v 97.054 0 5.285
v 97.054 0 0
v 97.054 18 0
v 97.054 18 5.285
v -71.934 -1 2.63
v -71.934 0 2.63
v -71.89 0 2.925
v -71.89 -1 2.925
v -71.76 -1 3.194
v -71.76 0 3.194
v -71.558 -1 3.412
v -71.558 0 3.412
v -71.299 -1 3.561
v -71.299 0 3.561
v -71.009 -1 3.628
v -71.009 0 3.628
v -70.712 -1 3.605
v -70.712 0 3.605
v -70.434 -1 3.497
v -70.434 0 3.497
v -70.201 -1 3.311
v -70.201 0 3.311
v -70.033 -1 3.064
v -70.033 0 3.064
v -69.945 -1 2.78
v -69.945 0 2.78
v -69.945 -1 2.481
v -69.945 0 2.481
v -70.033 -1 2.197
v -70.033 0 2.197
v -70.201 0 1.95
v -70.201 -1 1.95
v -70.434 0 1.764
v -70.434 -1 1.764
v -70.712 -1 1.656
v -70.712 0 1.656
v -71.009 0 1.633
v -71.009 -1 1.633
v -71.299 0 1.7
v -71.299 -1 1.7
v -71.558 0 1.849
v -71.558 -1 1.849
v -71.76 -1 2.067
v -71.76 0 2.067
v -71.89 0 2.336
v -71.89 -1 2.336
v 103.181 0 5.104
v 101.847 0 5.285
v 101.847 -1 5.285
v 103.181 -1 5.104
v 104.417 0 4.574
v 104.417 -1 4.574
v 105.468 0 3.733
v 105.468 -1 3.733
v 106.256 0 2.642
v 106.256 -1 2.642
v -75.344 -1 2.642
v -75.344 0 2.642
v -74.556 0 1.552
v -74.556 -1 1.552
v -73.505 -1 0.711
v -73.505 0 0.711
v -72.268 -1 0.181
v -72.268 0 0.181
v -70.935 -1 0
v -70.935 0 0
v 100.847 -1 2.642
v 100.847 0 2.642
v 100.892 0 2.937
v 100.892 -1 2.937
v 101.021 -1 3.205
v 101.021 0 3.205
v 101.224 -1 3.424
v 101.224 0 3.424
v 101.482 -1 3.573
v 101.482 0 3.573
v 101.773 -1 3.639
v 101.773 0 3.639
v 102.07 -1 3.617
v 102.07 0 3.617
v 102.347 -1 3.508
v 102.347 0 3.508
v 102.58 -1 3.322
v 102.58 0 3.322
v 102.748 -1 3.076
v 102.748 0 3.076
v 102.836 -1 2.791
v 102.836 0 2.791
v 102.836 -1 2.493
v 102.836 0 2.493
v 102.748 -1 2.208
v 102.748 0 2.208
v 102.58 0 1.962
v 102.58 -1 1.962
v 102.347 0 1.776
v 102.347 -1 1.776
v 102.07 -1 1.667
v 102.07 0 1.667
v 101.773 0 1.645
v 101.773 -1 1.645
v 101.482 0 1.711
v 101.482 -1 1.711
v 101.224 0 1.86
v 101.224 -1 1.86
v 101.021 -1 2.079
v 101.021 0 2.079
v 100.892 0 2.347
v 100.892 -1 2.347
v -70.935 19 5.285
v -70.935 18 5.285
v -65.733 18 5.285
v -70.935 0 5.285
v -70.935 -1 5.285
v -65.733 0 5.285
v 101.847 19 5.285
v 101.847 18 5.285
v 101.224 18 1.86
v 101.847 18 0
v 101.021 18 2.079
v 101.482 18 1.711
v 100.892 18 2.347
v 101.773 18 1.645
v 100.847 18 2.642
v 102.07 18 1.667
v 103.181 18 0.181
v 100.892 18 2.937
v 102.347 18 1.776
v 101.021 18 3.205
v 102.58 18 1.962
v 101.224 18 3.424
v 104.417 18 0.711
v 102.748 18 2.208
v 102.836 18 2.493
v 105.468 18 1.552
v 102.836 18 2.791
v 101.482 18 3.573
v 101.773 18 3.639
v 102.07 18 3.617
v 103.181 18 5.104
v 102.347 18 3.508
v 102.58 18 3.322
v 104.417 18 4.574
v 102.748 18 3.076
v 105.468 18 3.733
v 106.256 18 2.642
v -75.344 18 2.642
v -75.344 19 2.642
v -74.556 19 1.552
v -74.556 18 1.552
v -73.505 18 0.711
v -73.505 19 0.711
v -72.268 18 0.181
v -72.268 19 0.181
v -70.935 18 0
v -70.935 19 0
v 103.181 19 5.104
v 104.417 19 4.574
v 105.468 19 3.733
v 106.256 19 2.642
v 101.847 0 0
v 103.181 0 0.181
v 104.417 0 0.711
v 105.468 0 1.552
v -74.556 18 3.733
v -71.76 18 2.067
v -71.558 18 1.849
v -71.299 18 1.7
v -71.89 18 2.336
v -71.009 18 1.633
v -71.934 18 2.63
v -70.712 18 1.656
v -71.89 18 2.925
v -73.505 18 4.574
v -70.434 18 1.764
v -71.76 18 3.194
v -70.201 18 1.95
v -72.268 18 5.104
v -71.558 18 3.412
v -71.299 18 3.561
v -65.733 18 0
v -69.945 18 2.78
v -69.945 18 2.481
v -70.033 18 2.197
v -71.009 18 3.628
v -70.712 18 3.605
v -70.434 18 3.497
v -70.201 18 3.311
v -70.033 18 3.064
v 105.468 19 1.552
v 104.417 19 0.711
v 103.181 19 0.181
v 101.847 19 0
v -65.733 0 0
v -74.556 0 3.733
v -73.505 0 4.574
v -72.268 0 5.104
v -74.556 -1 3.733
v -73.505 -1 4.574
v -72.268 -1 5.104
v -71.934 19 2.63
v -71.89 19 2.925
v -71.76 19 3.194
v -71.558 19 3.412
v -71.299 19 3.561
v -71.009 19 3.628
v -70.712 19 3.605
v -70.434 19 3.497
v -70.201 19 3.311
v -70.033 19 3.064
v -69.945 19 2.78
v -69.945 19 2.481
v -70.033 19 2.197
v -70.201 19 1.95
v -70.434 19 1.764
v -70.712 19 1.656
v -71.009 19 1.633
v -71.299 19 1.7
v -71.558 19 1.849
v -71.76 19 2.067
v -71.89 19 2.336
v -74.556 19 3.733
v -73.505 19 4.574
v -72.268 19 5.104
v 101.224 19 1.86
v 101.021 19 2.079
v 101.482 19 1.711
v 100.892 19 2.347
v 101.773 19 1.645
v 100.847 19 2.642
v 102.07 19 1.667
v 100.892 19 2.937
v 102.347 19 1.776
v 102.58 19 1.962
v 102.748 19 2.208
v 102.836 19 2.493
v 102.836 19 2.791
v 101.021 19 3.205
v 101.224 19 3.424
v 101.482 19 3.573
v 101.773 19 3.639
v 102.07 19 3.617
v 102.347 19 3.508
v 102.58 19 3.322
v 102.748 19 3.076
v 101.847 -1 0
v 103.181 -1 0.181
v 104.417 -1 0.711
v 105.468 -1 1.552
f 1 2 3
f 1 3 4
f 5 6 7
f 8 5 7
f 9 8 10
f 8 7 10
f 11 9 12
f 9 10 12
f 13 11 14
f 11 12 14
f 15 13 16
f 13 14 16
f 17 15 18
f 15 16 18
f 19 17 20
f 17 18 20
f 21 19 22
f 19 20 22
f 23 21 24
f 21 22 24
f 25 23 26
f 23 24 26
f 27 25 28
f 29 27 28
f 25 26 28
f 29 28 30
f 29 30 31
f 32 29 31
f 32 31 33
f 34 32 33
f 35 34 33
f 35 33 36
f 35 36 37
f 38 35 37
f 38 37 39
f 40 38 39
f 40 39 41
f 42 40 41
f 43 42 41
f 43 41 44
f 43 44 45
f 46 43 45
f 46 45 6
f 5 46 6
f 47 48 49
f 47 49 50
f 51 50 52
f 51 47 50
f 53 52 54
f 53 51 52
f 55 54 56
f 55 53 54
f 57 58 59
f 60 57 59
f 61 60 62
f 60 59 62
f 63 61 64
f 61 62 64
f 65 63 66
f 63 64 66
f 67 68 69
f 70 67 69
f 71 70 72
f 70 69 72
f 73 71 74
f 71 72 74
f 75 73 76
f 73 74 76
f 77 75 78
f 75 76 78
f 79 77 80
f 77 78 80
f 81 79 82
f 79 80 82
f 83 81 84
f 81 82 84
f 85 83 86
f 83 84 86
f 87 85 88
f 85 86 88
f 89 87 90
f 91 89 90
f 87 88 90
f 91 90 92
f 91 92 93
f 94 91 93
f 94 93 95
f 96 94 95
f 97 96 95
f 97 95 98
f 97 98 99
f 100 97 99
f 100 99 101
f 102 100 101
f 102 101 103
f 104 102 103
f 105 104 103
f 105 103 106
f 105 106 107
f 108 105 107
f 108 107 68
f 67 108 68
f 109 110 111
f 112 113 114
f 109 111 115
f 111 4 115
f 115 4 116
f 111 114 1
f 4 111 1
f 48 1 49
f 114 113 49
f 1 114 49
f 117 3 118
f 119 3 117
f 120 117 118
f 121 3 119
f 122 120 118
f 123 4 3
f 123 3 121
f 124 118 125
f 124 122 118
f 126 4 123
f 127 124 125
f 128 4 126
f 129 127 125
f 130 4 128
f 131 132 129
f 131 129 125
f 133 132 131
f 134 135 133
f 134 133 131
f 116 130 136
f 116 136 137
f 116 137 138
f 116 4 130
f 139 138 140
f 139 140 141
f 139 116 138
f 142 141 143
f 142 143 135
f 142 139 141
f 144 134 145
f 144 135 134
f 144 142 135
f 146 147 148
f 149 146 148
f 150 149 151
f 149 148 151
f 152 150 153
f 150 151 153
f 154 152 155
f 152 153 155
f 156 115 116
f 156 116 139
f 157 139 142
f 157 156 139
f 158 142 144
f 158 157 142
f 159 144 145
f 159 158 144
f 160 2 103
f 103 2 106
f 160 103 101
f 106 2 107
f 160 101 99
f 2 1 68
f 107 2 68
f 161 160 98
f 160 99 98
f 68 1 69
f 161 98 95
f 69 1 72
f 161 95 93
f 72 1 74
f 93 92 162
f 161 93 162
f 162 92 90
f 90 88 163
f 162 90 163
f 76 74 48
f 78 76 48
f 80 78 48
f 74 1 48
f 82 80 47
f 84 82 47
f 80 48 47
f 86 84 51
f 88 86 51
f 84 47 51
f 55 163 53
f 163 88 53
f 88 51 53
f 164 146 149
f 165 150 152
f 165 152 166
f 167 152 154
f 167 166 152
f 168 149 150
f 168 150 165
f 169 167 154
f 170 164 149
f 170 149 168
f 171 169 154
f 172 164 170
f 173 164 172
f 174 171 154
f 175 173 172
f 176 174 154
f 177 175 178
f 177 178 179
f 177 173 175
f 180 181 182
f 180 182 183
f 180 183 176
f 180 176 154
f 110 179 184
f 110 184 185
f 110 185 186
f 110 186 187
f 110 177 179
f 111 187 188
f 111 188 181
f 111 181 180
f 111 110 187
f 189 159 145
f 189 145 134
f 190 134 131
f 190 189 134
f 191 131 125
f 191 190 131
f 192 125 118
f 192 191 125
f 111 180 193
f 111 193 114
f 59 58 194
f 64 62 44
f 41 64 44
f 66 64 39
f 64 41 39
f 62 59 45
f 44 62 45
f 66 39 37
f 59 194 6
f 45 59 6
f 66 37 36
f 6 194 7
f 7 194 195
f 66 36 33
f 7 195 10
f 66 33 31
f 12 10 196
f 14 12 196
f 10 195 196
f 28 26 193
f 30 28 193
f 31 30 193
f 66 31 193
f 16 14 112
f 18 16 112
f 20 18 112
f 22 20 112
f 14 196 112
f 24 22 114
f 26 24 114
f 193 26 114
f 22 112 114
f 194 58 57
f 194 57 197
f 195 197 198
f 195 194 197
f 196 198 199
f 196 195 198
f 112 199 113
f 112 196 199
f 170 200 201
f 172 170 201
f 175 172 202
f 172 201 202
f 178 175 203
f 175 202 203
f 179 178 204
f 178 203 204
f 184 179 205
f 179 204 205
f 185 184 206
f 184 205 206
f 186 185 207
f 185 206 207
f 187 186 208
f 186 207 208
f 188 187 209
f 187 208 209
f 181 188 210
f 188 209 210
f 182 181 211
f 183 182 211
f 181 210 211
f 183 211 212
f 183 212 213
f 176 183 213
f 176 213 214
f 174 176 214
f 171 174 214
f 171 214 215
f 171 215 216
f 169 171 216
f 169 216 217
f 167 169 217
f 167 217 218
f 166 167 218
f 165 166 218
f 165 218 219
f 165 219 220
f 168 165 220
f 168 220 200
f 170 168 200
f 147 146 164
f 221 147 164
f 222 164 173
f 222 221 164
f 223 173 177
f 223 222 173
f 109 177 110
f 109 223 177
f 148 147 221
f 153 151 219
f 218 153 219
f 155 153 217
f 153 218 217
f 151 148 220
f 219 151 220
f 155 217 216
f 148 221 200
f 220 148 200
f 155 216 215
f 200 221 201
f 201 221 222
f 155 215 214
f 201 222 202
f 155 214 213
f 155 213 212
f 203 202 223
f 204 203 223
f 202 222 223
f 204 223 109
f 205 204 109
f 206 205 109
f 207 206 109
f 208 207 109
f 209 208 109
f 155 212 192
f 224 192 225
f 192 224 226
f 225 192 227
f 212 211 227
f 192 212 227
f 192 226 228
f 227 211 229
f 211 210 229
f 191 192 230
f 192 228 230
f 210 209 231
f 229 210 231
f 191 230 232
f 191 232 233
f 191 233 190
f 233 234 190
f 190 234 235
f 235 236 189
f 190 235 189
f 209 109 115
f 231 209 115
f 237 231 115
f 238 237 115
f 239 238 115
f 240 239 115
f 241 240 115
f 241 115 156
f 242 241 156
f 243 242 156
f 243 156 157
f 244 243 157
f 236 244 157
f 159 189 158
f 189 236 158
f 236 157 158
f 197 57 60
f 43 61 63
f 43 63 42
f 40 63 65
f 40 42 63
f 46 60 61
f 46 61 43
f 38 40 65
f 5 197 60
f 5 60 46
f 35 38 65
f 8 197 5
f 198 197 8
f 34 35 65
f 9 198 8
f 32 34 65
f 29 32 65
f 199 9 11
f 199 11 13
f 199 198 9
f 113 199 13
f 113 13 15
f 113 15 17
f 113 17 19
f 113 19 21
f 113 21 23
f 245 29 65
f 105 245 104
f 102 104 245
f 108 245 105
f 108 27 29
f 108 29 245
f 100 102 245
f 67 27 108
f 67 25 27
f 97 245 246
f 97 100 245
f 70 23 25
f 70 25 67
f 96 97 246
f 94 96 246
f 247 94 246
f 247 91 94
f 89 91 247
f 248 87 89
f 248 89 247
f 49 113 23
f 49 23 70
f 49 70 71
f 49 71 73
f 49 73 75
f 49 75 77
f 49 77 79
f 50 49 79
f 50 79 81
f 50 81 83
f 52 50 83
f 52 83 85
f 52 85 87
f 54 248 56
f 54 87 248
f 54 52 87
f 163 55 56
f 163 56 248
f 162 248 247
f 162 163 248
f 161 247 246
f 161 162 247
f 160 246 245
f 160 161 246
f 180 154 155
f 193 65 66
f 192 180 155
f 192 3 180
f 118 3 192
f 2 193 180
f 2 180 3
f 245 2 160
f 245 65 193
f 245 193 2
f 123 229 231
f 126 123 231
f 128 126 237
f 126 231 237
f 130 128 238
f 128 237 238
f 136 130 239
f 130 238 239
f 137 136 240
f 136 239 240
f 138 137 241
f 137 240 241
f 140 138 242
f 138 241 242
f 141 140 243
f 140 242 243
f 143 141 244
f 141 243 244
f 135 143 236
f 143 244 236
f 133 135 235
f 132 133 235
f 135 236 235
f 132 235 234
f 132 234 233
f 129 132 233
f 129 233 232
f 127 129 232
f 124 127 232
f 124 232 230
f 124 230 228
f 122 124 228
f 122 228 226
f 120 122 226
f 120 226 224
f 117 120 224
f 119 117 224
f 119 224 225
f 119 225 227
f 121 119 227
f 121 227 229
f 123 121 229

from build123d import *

# Parameters (mm, degrees)
F0_W        = 182.7820166945
F0_H        = 5.2849859931
F1_DEPTH    = 20
F2_T1_DEPTH = 45
F3_D        = 2
F4_T1_DEPTH = 45
F5_D        = 2
F6_W        = 10.6622725725
F6_H        = 5.6903085506
F9_DEPTH    = 18
F6_W_2      = 10.1688206196
F6_H_2      = 8.087759139
F10_DEPTH   = 18


# Not quite as in the source:
# - a fillet or chamfer that OpenCascade refuses, or shapes differently, is made with other operations: its cross-section is extruded or revolved along the edge and cut away or added


with BuildPart() as f1:
    # F0 (on Front) → F1 (new body)
    with BuildSketch(Plane.XZ):
        with Locations((16.4561159909, 2.6424929965)):
            Rectangle(F0_W, F0_H)
    extrude(amount=-F1_DEPTH)

    # F2: fillet of radius 5 on 2 edges, made by hand

    # F2_s2 → F2_t1 (cut)
    with BuildSketch(Plane.XZ.offset(-32.5)):
        with BuildLine():
            ThreePointArc((-74.9348923564, 0.2849859931), (-73.4704262623, 3.820519899), (-69.9348923564, 5.2849859931))
            Line((-69.9348923564, 5.2849859931), (-74.9348923564, 5.2849859931))
            Line((-74.9348923564, 5.2849859931), (-74.9348923564, 0.2849859931))
        make_face()
        with BuildLine():
            ThreePointArc((-74.9348923564, 5), (-73.4704262623, 1.4644660941), (-69.9348923564, 0))
            Line((-69.9348923564, 0), (-74.9348923564, 0))
            Line((-74.9348923564, 0), (-74.9348923564, 5))
        make_face()
    extrude(amount=F2_T1_DEPTH, mode=Mode.SUBTRACT)

    # F3 (through all)
    with Locations(Plane.XZ):
        with Locations((-69.9340328574, 2.630488947)):
            Hole(F3_D / 2)

    # F4: fillet of radius 5 on 2 edges, made by hand

    # F4_s2 → F4_t1 (cut)
    with BuildSketch(Plane.XZ.offset(-32.5)):
        with BuildLine():
            ThreePointArc((102.8471243382, 5.2849859931), (106.3826582441, 3.820519899), (107.8471243382, 0.2849859931))
            Line((107.8471243382, 0.2849859931), (107.8471243382, 5.2849859931))
            Line((107.8471243382, 5.2849859931), (102.8471243382, 5.2849859931))
        make_face()
        with BuildLine():
            ThreePointArc((107.8471243382, 5), (106.3826582441, 1.4644660941), (102.8471243382, 0))
            Line((102.8471243382, 0), (107.8471243382, 0))
            Line((107.8471243382, 0), (107.8471243382, 5))
        make_face()
    extrude(amount=F4_T1_DEPTH, mode=Mode.SUBTRACT)

    # F5 (through all)
    with Locations(Plane.XZ):
        with Locations((102.8473824263, 2.641917672)):
            Hole(F5_D / 2)


with BuildPart() as f1_1:
    # F7: moved
    add(f1.part.moved(Location((-1, 1, 0))))


with BuildPart() as f1_2:
    # F8: moved
    add(f1_1.part.moved(Location((0, -2, 0))))

    # F6 (on Front) → F9 (cut)
    with BuildSketch(Plane.XZ):
        with Locations((-71.0640922189, 2.8451542753)):
            Rectangle(F6_W, F6_H)
    extrude(amount=-F9_DEPTH, mode=Mode.SUBTRACT)

    # F6 (on Front) → F10 (cut)
    with BuildSketch(Plane.XZ):
        with Locations((102.1384820342, 2.511022496)):
            Rectangle(F6_W_2, F6_H_2)
    extrude(amount=-F10_DEPTH, mode=Mode.SUBTRACT)


solid = f1_2.part
